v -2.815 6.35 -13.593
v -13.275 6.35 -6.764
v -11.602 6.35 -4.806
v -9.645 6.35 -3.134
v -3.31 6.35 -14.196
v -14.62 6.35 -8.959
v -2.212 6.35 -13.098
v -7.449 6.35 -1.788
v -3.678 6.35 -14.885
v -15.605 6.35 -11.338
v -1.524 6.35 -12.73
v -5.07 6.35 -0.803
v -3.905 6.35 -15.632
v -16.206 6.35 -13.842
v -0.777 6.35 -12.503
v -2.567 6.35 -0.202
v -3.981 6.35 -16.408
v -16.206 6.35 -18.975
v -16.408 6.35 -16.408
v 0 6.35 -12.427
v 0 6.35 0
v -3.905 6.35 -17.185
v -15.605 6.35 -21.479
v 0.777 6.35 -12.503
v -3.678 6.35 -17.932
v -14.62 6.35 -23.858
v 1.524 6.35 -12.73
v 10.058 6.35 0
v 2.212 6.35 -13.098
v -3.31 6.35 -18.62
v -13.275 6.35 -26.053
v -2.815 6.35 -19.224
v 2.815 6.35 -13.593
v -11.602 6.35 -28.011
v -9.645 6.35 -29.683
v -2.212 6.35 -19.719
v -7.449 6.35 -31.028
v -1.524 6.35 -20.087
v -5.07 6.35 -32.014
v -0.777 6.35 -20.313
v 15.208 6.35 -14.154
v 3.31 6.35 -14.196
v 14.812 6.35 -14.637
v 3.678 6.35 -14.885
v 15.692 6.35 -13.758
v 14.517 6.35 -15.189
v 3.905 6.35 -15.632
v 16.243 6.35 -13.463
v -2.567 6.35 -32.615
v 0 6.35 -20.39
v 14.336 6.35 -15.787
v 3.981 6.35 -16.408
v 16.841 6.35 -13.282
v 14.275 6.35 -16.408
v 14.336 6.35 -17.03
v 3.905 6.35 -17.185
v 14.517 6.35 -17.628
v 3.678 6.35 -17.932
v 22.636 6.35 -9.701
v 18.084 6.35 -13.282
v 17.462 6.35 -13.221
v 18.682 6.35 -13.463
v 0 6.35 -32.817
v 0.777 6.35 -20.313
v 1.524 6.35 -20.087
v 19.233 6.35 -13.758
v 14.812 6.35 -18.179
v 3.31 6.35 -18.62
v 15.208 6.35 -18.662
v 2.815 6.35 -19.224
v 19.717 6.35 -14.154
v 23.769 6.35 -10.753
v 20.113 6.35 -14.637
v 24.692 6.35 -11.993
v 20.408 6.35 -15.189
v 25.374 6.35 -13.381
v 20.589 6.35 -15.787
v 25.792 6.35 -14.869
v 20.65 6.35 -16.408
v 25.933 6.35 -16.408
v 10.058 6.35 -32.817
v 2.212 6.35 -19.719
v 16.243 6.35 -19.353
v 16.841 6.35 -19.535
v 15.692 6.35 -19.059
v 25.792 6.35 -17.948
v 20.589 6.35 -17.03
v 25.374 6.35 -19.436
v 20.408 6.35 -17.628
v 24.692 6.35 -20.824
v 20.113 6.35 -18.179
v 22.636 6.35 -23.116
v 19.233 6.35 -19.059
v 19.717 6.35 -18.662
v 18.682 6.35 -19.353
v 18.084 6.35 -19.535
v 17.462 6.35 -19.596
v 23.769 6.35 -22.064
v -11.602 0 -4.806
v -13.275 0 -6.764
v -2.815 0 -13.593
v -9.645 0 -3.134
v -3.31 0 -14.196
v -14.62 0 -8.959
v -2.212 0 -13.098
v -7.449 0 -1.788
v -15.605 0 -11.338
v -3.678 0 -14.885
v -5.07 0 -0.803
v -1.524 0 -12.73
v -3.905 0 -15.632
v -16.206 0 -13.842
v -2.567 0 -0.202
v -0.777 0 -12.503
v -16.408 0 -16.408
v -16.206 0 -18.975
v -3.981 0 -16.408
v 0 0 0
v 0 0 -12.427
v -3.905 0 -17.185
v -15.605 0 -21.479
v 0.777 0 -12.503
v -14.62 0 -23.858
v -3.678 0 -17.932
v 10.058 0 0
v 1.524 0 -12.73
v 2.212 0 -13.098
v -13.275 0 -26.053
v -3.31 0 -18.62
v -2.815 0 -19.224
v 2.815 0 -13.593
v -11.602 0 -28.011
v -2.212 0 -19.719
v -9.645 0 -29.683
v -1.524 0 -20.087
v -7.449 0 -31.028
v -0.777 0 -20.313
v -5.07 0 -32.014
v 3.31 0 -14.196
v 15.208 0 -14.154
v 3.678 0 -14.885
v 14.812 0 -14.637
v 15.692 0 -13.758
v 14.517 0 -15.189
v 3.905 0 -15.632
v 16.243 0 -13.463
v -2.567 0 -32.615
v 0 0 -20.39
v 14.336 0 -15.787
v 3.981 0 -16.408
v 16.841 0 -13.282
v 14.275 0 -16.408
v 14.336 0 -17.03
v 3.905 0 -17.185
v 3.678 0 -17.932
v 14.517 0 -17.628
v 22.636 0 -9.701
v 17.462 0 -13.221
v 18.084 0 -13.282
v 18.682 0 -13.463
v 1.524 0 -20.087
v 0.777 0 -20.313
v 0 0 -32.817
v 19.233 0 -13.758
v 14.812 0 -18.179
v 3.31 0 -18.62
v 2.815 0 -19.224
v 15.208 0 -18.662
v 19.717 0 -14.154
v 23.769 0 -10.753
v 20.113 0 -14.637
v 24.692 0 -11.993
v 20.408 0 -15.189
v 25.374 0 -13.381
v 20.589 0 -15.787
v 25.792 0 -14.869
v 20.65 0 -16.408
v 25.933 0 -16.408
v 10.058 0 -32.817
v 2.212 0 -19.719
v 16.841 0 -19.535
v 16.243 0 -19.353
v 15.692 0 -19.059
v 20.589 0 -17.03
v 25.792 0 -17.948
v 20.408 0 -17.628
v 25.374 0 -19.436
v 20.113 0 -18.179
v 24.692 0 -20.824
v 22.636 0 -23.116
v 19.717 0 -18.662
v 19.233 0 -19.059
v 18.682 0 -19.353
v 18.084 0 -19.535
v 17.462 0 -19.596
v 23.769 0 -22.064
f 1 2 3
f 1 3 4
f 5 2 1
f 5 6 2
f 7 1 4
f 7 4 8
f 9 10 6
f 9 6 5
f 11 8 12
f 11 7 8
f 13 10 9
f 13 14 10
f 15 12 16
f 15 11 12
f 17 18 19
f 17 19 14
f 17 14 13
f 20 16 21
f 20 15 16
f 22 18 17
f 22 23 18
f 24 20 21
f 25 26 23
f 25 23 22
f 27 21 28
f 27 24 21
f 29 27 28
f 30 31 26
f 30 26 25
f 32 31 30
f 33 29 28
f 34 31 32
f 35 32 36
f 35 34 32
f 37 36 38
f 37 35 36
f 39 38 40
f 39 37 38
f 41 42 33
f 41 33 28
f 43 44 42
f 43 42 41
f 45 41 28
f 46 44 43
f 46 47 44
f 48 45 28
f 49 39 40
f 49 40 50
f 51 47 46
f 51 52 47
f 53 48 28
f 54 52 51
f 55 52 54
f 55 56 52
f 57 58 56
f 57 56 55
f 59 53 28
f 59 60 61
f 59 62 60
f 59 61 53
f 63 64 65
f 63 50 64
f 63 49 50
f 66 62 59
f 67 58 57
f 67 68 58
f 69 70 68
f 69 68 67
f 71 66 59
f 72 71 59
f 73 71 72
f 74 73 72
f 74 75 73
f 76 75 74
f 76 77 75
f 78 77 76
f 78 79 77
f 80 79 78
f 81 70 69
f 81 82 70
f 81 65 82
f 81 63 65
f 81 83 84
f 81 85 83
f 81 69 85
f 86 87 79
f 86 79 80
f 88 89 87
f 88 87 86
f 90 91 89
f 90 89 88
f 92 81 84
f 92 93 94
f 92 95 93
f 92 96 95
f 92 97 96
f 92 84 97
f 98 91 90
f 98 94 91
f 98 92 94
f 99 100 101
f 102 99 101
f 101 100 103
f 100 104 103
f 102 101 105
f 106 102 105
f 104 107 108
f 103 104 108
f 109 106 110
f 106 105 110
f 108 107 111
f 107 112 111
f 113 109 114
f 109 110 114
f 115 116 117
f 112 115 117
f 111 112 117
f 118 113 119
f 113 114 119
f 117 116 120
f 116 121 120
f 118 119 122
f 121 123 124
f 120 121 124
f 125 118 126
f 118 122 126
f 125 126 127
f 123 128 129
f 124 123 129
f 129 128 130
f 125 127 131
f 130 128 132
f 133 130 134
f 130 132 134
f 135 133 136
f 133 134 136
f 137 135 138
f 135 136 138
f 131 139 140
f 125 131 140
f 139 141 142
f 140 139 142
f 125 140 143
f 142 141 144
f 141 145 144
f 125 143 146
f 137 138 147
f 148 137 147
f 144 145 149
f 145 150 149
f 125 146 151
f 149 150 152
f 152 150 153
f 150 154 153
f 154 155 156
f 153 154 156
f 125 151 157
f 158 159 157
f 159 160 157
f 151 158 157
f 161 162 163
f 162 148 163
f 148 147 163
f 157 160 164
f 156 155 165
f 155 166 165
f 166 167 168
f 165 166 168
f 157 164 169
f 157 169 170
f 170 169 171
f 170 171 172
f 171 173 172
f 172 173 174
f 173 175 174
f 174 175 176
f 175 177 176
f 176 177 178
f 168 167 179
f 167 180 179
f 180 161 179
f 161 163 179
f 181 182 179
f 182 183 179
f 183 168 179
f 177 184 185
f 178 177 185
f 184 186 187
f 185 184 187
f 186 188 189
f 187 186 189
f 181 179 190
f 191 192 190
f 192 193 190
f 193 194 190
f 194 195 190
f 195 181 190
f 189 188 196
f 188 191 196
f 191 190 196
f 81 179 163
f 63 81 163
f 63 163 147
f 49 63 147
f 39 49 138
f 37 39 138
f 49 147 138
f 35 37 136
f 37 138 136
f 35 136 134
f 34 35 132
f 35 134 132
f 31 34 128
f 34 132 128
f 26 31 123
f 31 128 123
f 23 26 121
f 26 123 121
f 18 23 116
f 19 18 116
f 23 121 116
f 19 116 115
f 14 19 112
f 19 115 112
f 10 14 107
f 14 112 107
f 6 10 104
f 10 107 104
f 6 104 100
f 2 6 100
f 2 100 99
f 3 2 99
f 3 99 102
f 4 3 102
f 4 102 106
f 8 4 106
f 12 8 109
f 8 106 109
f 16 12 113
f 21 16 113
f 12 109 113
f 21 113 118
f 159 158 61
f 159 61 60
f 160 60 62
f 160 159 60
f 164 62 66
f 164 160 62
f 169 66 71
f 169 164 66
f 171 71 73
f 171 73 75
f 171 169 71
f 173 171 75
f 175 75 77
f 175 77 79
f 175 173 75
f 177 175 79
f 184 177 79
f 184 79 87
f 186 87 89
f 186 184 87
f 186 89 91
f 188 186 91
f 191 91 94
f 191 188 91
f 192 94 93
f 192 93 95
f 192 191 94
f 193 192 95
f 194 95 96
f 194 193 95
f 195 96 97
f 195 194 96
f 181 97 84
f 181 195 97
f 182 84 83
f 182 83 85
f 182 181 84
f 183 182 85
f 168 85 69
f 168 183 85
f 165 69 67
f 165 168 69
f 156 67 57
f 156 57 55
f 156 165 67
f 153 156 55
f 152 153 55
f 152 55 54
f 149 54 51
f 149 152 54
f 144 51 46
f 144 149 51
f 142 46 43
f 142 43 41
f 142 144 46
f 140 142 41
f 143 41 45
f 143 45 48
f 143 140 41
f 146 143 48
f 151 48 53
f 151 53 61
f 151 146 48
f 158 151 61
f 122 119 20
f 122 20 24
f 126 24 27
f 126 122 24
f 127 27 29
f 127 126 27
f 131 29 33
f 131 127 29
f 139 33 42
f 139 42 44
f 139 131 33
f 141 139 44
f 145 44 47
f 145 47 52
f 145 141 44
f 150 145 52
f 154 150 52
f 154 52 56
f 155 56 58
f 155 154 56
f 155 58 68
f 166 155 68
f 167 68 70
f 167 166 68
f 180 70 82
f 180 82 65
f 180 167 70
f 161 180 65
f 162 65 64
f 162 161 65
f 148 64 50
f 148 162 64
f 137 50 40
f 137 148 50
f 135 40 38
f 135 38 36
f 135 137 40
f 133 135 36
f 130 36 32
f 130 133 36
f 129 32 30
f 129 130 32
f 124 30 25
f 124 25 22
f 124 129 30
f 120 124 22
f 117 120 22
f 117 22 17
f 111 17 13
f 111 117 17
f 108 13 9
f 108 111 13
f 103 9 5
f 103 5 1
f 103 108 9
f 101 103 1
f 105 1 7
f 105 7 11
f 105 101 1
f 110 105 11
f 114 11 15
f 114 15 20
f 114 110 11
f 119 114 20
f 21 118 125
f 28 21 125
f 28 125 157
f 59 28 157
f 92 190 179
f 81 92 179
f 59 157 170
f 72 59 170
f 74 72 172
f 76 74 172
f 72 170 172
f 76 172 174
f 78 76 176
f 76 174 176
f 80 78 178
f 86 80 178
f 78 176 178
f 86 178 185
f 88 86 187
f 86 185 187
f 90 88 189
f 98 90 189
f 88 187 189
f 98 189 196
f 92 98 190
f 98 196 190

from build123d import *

# Parameters (mm, degrees)
SKETCH1_R           = 3.98145
SKETCH1_R_2         = 3.1877
BOSS_EXTRUDE1_DEPTH = 6.35


with BuildPart() as part:
    # Sketch1 → Boss-Extrude1 (new body)
    with BuildSketch(Plane(origin=(0, 0, 0), x_dir=(1, 0, 0), z_dir=(0, 1, 0))):
        with BuildLine():
            Line((0, 0), (10.0584, 0))
            Line((10.0584, 0), (22.635934302, 9.700812927))
            ThreePointArc((22.635934302, 9.700812927), (25.9334, 16.4084), (22.635934302, 23.115987073))
            Line((22.635934302, 23.115987073), (10.0584, 32.8168))
            Line((10.0584, 32.8168), (0, 32.8168))
            ThreePointArc((0, 32.8168), (-16.4084, 16.4084), (0, 0))
        make_face()
        with Locations(Location((0, 16.4084, 0), (0, 0, 270))):
            Circle(SKETCH1_R, mode=Mode.SUBTRACT)
        with Locations(Location((17.4625, 16.4084, 0), (0, 0, 270))):
            Circle(SKETCH1_R_2, mode=Mode.SUBTRACT)
    extrude(amount=BOSS_EXTRUDE1_DEPTH)


solid = part.part
